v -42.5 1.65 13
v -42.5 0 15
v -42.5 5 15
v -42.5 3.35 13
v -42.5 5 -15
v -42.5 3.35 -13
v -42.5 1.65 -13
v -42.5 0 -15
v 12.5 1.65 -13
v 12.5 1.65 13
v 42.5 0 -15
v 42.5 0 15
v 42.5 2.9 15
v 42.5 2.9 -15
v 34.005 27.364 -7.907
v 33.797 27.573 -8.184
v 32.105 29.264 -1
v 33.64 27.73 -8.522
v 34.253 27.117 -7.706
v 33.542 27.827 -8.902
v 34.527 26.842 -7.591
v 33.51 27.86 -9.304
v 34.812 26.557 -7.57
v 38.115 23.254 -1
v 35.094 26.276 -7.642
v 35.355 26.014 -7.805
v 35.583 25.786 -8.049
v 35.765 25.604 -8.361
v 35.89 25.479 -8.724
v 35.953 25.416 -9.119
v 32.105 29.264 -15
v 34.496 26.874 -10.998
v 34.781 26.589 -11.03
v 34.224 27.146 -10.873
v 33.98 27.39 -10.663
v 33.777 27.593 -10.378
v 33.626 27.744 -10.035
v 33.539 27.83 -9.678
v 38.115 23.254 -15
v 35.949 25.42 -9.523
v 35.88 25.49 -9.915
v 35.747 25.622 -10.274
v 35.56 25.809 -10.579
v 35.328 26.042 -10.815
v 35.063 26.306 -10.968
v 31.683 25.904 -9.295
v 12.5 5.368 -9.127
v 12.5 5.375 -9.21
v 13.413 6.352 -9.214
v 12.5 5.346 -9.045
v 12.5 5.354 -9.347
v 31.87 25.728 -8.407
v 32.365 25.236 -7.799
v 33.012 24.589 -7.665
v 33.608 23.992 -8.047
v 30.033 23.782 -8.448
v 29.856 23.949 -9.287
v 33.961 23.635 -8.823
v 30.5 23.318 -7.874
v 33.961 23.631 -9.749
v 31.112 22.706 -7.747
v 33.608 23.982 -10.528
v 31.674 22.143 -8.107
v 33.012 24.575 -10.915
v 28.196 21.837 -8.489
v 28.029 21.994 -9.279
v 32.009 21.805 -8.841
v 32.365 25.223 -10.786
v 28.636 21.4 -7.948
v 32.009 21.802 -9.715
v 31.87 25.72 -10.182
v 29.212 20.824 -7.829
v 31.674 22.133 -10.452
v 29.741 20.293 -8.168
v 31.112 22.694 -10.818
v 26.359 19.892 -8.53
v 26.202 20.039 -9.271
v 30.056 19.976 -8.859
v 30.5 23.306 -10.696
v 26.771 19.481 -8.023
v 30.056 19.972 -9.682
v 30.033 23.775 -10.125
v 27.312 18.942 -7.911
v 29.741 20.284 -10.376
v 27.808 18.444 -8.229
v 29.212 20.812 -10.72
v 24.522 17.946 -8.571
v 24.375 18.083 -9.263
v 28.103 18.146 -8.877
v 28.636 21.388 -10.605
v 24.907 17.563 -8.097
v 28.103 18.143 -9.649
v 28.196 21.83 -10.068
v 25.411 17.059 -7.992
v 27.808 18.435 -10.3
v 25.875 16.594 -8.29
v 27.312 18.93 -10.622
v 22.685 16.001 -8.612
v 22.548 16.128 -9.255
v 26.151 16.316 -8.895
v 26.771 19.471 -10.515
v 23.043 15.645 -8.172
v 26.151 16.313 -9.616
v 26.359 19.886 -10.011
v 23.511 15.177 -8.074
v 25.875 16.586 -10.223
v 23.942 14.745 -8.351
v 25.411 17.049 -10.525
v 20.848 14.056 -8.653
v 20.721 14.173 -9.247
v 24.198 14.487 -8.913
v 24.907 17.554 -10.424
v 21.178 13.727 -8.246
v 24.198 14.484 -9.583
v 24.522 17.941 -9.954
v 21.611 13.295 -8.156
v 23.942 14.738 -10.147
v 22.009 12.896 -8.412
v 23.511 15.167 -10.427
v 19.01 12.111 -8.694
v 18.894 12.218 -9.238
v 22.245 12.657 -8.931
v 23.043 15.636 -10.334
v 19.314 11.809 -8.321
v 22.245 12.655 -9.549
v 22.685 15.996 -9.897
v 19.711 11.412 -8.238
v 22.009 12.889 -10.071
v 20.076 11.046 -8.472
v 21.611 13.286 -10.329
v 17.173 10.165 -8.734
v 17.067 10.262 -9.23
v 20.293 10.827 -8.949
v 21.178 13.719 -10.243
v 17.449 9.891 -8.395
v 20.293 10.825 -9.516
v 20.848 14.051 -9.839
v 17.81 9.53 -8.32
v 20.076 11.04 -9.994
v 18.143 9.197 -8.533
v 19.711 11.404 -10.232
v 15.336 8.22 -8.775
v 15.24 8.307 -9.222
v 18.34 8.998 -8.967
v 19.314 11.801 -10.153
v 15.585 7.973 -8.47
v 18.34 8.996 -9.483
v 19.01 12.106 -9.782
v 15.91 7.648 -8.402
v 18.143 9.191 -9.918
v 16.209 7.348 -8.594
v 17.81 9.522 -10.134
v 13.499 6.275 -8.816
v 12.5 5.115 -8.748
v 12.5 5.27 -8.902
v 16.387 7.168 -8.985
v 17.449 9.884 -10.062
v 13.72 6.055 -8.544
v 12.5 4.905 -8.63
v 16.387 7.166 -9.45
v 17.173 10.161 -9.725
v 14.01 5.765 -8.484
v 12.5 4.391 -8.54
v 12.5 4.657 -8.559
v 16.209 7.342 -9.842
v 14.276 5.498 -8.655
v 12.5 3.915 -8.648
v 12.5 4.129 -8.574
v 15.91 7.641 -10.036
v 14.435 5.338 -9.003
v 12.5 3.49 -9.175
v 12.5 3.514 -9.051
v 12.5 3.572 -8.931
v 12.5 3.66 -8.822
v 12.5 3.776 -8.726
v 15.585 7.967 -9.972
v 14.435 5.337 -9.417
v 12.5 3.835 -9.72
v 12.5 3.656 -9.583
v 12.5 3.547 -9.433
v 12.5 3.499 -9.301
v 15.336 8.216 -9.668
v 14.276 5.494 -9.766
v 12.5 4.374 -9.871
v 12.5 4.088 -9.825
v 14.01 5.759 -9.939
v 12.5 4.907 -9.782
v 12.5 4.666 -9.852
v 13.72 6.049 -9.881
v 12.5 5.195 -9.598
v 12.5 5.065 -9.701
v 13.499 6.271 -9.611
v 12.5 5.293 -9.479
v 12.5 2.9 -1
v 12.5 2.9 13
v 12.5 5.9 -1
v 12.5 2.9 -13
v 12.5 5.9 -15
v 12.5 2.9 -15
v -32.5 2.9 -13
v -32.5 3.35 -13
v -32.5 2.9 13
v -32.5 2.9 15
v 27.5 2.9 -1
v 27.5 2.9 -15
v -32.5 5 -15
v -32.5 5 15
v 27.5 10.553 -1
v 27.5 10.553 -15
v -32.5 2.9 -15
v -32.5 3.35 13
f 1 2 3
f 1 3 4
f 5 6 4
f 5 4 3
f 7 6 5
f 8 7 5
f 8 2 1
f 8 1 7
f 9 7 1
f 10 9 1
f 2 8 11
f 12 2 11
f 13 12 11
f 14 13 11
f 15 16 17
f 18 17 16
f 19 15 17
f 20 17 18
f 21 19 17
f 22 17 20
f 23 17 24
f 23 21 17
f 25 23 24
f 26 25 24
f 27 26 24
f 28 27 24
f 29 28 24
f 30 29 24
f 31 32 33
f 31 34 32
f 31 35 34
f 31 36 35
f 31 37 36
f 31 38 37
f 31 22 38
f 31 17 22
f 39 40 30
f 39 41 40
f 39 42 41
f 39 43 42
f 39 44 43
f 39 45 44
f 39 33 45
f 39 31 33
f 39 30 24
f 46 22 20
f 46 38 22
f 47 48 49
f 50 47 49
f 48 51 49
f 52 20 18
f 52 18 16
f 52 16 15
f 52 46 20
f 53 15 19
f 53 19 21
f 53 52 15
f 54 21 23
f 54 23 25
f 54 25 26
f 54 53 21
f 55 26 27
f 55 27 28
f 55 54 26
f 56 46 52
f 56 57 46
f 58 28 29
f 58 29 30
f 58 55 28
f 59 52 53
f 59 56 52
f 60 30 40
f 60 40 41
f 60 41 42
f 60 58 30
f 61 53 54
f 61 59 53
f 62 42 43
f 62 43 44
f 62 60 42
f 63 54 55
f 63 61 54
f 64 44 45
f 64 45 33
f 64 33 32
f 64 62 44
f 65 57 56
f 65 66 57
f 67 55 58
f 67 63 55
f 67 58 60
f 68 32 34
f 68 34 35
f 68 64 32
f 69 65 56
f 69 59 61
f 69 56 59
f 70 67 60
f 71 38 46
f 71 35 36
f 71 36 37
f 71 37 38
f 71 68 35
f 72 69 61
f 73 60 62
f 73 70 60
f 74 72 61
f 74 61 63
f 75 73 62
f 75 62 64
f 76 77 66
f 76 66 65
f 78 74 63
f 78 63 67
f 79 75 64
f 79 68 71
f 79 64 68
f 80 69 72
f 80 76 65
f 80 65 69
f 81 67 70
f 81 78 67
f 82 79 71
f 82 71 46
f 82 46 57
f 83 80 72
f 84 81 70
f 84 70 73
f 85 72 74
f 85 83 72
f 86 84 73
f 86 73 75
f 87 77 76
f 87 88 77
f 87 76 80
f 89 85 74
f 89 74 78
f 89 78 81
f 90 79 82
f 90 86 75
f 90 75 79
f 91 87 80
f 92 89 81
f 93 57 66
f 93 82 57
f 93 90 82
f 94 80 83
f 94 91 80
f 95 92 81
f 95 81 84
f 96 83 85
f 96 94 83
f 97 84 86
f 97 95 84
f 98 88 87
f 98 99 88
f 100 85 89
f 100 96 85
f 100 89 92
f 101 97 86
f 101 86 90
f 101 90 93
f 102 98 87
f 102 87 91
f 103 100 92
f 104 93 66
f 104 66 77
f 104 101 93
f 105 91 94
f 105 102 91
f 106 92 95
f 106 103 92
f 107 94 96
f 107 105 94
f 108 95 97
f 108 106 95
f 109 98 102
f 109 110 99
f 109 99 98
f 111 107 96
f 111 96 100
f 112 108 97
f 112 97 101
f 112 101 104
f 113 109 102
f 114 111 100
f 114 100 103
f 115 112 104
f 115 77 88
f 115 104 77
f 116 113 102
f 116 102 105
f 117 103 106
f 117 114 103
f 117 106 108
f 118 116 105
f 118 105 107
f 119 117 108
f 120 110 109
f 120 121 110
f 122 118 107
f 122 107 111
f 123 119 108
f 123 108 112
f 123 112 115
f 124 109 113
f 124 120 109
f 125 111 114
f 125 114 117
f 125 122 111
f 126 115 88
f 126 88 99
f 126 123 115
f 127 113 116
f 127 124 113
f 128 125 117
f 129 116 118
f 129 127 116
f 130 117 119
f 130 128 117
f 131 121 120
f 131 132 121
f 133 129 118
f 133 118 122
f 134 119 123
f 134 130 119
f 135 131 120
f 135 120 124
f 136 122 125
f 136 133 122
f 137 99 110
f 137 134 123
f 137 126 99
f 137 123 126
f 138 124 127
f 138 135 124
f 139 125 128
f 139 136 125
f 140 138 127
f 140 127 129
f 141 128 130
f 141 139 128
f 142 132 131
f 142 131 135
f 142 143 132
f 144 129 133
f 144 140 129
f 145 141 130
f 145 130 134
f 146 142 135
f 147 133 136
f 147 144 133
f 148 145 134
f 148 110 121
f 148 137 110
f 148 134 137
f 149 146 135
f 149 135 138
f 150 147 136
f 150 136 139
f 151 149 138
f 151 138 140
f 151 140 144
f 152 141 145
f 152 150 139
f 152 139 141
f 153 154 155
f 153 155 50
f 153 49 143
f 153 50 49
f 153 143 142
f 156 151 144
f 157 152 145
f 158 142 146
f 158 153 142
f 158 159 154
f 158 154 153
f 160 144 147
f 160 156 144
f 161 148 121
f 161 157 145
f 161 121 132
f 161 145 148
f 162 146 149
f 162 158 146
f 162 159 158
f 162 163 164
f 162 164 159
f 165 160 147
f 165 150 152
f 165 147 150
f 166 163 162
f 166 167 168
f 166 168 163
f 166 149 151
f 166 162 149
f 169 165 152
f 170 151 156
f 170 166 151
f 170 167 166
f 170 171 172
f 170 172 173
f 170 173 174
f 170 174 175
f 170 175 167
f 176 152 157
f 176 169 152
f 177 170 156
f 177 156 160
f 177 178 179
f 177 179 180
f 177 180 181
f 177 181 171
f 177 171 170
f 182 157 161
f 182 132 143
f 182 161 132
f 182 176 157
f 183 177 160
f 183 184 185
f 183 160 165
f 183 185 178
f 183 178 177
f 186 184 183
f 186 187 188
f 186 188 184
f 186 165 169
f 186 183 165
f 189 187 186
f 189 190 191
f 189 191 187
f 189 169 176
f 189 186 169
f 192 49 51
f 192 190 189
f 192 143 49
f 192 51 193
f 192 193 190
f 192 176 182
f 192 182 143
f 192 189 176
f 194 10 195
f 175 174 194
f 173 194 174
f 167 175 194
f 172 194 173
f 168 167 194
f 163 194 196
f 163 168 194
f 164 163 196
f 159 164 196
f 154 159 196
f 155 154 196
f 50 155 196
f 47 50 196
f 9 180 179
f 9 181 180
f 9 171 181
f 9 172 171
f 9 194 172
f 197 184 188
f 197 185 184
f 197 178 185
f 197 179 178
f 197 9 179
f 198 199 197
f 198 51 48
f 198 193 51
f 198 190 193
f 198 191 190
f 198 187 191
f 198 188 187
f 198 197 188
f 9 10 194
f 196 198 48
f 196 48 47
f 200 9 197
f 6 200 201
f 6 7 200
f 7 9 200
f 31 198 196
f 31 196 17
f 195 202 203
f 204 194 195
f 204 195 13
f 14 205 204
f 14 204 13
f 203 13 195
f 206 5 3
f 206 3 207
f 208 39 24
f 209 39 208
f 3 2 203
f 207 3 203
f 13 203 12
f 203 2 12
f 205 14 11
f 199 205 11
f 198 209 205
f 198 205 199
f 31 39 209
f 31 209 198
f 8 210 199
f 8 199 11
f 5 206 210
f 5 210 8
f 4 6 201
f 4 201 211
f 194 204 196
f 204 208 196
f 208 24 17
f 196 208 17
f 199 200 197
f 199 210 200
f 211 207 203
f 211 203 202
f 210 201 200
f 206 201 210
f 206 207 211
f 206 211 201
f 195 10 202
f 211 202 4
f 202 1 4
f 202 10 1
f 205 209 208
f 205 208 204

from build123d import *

# Parameters (mm, degrees)
SKETCH1_W           = 85
SKETCH1_H           = 30
BOSS_EXTRUDE1_DEPTH = 5
SKETCH2_W           = 26
SKETCH2_H           = 1.7
CUT_EXTRUDE1_DEPTH  = 55
SKETCH3_W           = 75
SKETCH3_H           = 30
CUT_EXTRUDE2_DEPTH  = 2.1
BOSS_EXTRUDE5_DEPTH = 14


with BuildPart() as part:
    # Sketch1 → Boss-Extrude1 (new body)
    with BuildSketch(Plane(origin=(0, 0, 0), x_dir=(1, 0, 0), z_dir=(0, 1, 0))):
        Rectangle(SKETCH1_W, SKETCH1_H)
    extrude(amount=BOSS_EXTRUDE1_DEPTH)

    # Sketch2 → Cut-Extrude1 (cut)
    with BuildSketch(Plane.ZY.offset(42.5)):
        with Locations((0, 2.5)):
            Rectangle(SKETCH2_W, SKETCH2_H)
    extrude(amount=-CUT_EXTRUDE1_DEPTH, mode=Mode.SUBTRACT)

    # Sketch3 → Cut-Extrude2 (cut)
    with BuildSketch(Plane(origin=(0, 5, 0), x_dir=(1, 0, 0), z_dir=(0, 1, 0))):
        with Locations((5, 0)):
            Rectangle(SKETCH3_W, SKETCH3_H)
    extrude(amount=-CUT_EXTRUDE2_DEPTH, mode=Mode.SUBTRACT)

    # Sketch10 → Boss-Extrude5 (add)
    with BuildSketch(Plane(origin=(0, 0, -15), x_dir=(-1, 0, 0), z_dir=(0, 0, -1))):
        Polygon((-27.5, 2.9), (-12.5, 2.9), (-12.5, 5.9), (-32.105022095, 29.264355515), (-38.115429736, 23.253947875), (-27.5, 10.552651361), align=None)
    extrude(amount=-BOSS_EXTRUDE5_DEPTH)

    # Sketch14 → Cut-Revolve5 (revolve, cut)
    with BuildSketch(Plane(origin=(4.05, -4.05, 0), x_dir=(0, 0, 1), z_dir=(-0.7071067811865432, 0.7071067811865518, 0)), mode=Mode.PRIVATE) as cut_revolve5_sk:
        Polygon((-9.8, 10.005560954), (-9.2, 10.005560954), (-9.3, 43.905413461), (-11.05, 43.905413461), align=None)
    revolve(cut_revolve5_sk.sketch.rotate(Axis((11.125, 3.025, -9.2), (0.7071037046891342, 0.7071037046891259, -0.0029498525073746134)), 89.830986391), axis=Axis((11.125, 3.025, -9.2), (0.7071037046891342, 0.7071037046891259, -0.0029498525073746134)), mode=Mode.SUBTRACT)


solid = part.part
